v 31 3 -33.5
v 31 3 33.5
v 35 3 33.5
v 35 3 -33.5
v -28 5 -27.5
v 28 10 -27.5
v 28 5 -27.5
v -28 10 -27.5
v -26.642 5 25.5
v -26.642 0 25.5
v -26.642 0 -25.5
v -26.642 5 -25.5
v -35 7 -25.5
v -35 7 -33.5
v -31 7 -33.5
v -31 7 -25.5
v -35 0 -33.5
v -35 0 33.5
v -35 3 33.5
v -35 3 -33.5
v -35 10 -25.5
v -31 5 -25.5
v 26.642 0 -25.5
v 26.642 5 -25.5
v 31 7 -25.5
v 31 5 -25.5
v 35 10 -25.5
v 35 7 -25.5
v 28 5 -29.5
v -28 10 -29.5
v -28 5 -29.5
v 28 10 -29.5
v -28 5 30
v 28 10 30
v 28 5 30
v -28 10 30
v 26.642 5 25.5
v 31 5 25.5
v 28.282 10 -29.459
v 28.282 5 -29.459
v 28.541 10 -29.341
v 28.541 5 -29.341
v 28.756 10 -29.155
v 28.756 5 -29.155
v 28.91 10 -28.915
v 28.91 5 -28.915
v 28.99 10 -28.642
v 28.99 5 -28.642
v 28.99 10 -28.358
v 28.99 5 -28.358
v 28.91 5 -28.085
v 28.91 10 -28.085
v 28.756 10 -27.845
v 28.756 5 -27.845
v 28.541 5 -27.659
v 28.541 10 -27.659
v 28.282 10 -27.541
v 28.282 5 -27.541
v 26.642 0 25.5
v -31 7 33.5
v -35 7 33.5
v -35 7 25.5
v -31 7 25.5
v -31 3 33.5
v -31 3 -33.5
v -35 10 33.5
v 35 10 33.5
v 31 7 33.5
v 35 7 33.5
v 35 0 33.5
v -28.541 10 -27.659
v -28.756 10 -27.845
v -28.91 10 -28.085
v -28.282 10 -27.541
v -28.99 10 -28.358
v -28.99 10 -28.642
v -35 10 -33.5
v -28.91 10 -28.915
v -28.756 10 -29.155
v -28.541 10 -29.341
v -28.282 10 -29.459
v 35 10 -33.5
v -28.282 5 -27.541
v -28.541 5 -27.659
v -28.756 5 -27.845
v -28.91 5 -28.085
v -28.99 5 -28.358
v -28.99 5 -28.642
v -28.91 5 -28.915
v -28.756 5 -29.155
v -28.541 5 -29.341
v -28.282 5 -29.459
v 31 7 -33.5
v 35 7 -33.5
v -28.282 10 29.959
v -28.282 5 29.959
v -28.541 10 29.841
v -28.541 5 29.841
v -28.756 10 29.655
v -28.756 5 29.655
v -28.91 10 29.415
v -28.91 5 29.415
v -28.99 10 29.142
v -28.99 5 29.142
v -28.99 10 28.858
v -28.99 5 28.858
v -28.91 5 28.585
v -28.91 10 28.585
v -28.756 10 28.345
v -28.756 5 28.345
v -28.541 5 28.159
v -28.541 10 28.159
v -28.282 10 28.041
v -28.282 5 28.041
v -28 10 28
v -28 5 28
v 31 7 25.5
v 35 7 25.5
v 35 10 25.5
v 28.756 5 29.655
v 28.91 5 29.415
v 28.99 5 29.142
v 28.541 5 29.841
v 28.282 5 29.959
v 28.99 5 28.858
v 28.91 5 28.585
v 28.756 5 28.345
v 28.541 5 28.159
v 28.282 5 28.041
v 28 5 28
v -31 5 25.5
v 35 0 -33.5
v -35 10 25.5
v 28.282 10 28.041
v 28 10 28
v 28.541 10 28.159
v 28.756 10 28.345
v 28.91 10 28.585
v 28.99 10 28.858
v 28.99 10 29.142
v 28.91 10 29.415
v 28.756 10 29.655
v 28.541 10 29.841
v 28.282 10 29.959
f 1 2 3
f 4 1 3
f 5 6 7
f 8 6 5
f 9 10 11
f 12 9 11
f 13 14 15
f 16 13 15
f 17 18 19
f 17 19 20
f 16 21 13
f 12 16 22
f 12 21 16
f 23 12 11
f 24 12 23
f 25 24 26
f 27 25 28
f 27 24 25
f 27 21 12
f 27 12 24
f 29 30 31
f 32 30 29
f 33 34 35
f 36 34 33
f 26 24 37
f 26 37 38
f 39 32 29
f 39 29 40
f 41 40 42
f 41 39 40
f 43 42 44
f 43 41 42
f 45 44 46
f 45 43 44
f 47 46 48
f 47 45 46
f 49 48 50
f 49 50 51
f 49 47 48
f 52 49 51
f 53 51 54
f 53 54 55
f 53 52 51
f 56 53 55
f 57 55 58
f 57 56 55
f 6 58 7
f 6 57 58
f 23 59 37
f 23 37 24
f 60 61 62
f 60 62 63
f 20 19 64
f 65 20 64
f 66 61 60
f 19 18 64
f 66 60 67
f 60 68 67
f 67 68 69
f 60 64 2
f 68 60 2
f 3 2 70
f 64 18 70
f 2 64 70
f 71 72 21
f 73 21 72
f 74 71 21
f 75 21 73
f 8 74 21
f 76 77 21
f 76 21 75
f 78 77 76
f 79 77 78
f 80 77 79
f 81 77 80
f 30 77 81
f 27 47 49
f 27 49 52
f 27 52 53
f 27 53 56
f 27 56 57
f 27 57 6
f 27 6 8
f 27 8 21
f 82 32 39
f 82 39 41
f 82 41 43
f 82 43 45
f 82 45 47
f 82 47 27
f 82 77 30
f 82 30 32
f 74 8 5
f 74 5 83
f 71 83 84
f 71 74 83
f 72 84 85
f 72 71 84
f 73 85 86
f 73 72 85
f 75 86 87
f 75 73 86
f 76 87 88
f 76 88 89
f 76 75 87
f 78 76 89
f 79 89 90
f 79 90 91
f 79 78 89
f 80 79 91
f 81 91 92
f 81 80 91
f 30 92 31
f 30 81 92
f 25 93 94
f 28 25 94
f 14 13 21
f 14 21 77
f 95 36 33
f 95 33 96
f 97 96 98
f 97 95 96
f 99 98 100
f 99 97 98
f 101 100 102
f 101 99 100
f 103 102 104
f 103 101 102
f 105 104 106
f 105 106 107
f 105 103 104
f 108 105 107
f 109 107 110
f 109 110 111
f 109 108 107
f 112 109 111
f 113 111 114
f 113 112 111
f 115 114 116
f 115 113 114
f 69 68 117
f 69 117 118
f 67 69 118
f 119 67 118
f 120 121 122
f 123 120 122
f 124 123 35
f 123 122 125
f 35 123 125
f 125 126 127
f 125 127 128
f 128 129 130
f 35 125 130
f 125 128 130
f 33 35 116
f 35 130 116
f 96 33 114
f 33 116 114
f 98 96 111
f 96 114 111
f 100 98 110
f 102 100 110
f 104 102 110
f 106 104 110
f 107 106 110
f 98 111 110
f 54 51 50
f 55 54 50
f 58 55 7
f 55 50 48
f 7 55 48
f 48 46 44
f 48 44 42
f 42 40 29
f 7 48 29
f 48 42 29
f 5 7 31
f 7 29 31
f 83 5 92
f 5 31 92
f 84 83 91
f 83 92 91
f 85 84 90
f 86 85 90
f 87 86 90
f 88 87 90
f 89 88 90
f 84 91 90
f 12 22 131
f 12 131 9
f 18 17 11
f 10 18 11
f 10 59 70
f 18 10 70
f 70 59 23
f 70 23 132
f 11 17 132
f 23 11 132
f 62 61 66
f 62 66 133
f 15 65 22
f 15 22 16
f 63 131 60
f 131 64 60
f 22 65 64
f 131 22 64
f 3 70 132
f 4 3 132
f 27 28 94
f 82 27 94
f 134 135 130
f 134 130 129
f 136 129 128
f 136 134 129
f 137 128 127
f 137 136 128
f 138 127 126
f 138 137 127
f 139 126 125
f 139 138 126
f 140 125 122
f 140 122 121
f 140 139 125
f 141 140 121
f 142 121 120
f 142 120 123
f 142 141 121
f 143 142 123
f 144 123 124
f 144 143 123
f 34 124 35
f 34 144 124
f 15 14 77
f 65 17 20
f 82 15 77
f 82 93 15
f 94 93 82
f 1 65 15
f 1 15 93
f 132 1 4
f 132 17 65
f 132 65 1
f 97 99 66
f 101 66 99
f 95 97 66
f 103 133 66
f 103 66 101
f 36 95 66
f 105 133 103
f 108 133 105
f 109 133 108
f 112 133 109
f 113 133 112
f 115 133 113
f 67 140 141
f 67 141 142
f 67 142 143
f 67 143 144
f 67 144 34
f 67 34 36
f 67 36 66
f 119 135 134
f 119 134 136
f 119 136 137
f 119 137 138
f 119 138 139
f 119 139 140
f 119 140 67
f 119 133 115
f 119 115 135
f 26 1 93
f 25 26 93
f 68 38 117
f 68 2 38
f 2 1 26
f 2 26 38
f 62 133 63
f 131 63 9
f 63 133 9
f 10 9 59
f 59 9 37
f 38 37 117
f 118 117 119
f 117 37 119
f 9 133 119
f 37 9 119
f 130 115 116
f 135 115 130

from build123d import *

# Parameters (mm, degrees)
ESQUISSE1_W             = 70
ESQUISSE1_H             = 67
ESQUISSE1_W_2           = 53.28358209
ESQUISSE1_H_2           = 51
BOSS_EXTRU_1_DEPTH      = 10
ESQUISSE2_W             = 8.358208955
ESQUISSE2_H             = 51
ENL_V_MAT_EXTRU_1_DEPTH = 5
ESQUISSE3_W             = 4
ESQUISSE3_H             = 4
ENL_V_MAT_EXTRU_2_DEPTH = 68
ENL_V_MAT_EXTRU_3_DEPTH = 5


with BuildPart() as part:
    # Esquisse1 → Boss.-Extru.1 (new body)
    with BuildSketch(Plane(origin=(0, 0, 0), x_dir=(1, 0, 0), z_dir=(0, 1, 0))):
        Rectangle(ESQUISSE1_W, ESQUISSE1_H)
        Rectangle(ESQUISSE1_W_2, ESQUISSE1_H_2, mode=Mode.SUBTRACT)
    extrude(amount=BOSS_EXTRU_1_DEPTH)

    # Esquisse2 → Enlèv. mat.-Extru.1 (cut)
    with BuildSketch(Plane(origin=(0, 10, 0), x_dir=(1, 0, 0), z_dir=(0, 1, 0))):
        with Locations((-30.820895523, 0)):
            Rectangle(ESQUISSE2_W, ESQUISSE2_H)
        with Locations((30.820895523, 0)):
            Rectangle(ESQUISSE2_W, ESQUISSE2_H)
    extrude(amount=-ENL_V_MAT_EXTRU_1_DEPTH, mode=Mode.SUBTRACT)

    # Esquisse3 → Enlèv. mat.-Extru.2 (cut, through all)
    with BuildSketch(Plane.XY.offset(33.5)):
        with Locations((33, 5)):
            Rectangle(ESQUISSE3_W, ESQUISSE3_H)
        with Locations((-33, 5)):
            Rectangle(ESQUISSE3_W, ESQUISSE3_H)
    extrude(amount=-ENL_V_MAT_EXTRU_2_DEPTH, mode=Mode.SUBTRACT)

    # Esquisse4 → Enlèv. mat.-Extru.3 (cut)
    with BuildSketch(Plane(origin=(0, 10, 0), x_dir=(1, 0, 0), z_dir=(0, 1, 0))):
        with BuildLine():
            Line((-28, 29.5), (28, 29.5))
            ThreePointArc((28, 29.5), (29, 28.5), (28, 27.5))
            Line((28, 27.5), (-28, 27.5))
            ThreePointArc((-28, 27.5), (-29, 28.5), (-28, 29.5))
        make_face()
        with BuildLine():
            Line((28, -30), (-28, -30))
            ThreePointArc((-28, -30), (-29, -29), (-28, -28))
            Line((-28, -28), (28, -28))
            ThreePointArc((28, -28), (29, -29), (28, -30))
        make_face()
    extrude(amount=-ENL_V_MAT_EXTRU_3_DEPTH, mode=Mode.SUBTRACT)


solid = part.part
